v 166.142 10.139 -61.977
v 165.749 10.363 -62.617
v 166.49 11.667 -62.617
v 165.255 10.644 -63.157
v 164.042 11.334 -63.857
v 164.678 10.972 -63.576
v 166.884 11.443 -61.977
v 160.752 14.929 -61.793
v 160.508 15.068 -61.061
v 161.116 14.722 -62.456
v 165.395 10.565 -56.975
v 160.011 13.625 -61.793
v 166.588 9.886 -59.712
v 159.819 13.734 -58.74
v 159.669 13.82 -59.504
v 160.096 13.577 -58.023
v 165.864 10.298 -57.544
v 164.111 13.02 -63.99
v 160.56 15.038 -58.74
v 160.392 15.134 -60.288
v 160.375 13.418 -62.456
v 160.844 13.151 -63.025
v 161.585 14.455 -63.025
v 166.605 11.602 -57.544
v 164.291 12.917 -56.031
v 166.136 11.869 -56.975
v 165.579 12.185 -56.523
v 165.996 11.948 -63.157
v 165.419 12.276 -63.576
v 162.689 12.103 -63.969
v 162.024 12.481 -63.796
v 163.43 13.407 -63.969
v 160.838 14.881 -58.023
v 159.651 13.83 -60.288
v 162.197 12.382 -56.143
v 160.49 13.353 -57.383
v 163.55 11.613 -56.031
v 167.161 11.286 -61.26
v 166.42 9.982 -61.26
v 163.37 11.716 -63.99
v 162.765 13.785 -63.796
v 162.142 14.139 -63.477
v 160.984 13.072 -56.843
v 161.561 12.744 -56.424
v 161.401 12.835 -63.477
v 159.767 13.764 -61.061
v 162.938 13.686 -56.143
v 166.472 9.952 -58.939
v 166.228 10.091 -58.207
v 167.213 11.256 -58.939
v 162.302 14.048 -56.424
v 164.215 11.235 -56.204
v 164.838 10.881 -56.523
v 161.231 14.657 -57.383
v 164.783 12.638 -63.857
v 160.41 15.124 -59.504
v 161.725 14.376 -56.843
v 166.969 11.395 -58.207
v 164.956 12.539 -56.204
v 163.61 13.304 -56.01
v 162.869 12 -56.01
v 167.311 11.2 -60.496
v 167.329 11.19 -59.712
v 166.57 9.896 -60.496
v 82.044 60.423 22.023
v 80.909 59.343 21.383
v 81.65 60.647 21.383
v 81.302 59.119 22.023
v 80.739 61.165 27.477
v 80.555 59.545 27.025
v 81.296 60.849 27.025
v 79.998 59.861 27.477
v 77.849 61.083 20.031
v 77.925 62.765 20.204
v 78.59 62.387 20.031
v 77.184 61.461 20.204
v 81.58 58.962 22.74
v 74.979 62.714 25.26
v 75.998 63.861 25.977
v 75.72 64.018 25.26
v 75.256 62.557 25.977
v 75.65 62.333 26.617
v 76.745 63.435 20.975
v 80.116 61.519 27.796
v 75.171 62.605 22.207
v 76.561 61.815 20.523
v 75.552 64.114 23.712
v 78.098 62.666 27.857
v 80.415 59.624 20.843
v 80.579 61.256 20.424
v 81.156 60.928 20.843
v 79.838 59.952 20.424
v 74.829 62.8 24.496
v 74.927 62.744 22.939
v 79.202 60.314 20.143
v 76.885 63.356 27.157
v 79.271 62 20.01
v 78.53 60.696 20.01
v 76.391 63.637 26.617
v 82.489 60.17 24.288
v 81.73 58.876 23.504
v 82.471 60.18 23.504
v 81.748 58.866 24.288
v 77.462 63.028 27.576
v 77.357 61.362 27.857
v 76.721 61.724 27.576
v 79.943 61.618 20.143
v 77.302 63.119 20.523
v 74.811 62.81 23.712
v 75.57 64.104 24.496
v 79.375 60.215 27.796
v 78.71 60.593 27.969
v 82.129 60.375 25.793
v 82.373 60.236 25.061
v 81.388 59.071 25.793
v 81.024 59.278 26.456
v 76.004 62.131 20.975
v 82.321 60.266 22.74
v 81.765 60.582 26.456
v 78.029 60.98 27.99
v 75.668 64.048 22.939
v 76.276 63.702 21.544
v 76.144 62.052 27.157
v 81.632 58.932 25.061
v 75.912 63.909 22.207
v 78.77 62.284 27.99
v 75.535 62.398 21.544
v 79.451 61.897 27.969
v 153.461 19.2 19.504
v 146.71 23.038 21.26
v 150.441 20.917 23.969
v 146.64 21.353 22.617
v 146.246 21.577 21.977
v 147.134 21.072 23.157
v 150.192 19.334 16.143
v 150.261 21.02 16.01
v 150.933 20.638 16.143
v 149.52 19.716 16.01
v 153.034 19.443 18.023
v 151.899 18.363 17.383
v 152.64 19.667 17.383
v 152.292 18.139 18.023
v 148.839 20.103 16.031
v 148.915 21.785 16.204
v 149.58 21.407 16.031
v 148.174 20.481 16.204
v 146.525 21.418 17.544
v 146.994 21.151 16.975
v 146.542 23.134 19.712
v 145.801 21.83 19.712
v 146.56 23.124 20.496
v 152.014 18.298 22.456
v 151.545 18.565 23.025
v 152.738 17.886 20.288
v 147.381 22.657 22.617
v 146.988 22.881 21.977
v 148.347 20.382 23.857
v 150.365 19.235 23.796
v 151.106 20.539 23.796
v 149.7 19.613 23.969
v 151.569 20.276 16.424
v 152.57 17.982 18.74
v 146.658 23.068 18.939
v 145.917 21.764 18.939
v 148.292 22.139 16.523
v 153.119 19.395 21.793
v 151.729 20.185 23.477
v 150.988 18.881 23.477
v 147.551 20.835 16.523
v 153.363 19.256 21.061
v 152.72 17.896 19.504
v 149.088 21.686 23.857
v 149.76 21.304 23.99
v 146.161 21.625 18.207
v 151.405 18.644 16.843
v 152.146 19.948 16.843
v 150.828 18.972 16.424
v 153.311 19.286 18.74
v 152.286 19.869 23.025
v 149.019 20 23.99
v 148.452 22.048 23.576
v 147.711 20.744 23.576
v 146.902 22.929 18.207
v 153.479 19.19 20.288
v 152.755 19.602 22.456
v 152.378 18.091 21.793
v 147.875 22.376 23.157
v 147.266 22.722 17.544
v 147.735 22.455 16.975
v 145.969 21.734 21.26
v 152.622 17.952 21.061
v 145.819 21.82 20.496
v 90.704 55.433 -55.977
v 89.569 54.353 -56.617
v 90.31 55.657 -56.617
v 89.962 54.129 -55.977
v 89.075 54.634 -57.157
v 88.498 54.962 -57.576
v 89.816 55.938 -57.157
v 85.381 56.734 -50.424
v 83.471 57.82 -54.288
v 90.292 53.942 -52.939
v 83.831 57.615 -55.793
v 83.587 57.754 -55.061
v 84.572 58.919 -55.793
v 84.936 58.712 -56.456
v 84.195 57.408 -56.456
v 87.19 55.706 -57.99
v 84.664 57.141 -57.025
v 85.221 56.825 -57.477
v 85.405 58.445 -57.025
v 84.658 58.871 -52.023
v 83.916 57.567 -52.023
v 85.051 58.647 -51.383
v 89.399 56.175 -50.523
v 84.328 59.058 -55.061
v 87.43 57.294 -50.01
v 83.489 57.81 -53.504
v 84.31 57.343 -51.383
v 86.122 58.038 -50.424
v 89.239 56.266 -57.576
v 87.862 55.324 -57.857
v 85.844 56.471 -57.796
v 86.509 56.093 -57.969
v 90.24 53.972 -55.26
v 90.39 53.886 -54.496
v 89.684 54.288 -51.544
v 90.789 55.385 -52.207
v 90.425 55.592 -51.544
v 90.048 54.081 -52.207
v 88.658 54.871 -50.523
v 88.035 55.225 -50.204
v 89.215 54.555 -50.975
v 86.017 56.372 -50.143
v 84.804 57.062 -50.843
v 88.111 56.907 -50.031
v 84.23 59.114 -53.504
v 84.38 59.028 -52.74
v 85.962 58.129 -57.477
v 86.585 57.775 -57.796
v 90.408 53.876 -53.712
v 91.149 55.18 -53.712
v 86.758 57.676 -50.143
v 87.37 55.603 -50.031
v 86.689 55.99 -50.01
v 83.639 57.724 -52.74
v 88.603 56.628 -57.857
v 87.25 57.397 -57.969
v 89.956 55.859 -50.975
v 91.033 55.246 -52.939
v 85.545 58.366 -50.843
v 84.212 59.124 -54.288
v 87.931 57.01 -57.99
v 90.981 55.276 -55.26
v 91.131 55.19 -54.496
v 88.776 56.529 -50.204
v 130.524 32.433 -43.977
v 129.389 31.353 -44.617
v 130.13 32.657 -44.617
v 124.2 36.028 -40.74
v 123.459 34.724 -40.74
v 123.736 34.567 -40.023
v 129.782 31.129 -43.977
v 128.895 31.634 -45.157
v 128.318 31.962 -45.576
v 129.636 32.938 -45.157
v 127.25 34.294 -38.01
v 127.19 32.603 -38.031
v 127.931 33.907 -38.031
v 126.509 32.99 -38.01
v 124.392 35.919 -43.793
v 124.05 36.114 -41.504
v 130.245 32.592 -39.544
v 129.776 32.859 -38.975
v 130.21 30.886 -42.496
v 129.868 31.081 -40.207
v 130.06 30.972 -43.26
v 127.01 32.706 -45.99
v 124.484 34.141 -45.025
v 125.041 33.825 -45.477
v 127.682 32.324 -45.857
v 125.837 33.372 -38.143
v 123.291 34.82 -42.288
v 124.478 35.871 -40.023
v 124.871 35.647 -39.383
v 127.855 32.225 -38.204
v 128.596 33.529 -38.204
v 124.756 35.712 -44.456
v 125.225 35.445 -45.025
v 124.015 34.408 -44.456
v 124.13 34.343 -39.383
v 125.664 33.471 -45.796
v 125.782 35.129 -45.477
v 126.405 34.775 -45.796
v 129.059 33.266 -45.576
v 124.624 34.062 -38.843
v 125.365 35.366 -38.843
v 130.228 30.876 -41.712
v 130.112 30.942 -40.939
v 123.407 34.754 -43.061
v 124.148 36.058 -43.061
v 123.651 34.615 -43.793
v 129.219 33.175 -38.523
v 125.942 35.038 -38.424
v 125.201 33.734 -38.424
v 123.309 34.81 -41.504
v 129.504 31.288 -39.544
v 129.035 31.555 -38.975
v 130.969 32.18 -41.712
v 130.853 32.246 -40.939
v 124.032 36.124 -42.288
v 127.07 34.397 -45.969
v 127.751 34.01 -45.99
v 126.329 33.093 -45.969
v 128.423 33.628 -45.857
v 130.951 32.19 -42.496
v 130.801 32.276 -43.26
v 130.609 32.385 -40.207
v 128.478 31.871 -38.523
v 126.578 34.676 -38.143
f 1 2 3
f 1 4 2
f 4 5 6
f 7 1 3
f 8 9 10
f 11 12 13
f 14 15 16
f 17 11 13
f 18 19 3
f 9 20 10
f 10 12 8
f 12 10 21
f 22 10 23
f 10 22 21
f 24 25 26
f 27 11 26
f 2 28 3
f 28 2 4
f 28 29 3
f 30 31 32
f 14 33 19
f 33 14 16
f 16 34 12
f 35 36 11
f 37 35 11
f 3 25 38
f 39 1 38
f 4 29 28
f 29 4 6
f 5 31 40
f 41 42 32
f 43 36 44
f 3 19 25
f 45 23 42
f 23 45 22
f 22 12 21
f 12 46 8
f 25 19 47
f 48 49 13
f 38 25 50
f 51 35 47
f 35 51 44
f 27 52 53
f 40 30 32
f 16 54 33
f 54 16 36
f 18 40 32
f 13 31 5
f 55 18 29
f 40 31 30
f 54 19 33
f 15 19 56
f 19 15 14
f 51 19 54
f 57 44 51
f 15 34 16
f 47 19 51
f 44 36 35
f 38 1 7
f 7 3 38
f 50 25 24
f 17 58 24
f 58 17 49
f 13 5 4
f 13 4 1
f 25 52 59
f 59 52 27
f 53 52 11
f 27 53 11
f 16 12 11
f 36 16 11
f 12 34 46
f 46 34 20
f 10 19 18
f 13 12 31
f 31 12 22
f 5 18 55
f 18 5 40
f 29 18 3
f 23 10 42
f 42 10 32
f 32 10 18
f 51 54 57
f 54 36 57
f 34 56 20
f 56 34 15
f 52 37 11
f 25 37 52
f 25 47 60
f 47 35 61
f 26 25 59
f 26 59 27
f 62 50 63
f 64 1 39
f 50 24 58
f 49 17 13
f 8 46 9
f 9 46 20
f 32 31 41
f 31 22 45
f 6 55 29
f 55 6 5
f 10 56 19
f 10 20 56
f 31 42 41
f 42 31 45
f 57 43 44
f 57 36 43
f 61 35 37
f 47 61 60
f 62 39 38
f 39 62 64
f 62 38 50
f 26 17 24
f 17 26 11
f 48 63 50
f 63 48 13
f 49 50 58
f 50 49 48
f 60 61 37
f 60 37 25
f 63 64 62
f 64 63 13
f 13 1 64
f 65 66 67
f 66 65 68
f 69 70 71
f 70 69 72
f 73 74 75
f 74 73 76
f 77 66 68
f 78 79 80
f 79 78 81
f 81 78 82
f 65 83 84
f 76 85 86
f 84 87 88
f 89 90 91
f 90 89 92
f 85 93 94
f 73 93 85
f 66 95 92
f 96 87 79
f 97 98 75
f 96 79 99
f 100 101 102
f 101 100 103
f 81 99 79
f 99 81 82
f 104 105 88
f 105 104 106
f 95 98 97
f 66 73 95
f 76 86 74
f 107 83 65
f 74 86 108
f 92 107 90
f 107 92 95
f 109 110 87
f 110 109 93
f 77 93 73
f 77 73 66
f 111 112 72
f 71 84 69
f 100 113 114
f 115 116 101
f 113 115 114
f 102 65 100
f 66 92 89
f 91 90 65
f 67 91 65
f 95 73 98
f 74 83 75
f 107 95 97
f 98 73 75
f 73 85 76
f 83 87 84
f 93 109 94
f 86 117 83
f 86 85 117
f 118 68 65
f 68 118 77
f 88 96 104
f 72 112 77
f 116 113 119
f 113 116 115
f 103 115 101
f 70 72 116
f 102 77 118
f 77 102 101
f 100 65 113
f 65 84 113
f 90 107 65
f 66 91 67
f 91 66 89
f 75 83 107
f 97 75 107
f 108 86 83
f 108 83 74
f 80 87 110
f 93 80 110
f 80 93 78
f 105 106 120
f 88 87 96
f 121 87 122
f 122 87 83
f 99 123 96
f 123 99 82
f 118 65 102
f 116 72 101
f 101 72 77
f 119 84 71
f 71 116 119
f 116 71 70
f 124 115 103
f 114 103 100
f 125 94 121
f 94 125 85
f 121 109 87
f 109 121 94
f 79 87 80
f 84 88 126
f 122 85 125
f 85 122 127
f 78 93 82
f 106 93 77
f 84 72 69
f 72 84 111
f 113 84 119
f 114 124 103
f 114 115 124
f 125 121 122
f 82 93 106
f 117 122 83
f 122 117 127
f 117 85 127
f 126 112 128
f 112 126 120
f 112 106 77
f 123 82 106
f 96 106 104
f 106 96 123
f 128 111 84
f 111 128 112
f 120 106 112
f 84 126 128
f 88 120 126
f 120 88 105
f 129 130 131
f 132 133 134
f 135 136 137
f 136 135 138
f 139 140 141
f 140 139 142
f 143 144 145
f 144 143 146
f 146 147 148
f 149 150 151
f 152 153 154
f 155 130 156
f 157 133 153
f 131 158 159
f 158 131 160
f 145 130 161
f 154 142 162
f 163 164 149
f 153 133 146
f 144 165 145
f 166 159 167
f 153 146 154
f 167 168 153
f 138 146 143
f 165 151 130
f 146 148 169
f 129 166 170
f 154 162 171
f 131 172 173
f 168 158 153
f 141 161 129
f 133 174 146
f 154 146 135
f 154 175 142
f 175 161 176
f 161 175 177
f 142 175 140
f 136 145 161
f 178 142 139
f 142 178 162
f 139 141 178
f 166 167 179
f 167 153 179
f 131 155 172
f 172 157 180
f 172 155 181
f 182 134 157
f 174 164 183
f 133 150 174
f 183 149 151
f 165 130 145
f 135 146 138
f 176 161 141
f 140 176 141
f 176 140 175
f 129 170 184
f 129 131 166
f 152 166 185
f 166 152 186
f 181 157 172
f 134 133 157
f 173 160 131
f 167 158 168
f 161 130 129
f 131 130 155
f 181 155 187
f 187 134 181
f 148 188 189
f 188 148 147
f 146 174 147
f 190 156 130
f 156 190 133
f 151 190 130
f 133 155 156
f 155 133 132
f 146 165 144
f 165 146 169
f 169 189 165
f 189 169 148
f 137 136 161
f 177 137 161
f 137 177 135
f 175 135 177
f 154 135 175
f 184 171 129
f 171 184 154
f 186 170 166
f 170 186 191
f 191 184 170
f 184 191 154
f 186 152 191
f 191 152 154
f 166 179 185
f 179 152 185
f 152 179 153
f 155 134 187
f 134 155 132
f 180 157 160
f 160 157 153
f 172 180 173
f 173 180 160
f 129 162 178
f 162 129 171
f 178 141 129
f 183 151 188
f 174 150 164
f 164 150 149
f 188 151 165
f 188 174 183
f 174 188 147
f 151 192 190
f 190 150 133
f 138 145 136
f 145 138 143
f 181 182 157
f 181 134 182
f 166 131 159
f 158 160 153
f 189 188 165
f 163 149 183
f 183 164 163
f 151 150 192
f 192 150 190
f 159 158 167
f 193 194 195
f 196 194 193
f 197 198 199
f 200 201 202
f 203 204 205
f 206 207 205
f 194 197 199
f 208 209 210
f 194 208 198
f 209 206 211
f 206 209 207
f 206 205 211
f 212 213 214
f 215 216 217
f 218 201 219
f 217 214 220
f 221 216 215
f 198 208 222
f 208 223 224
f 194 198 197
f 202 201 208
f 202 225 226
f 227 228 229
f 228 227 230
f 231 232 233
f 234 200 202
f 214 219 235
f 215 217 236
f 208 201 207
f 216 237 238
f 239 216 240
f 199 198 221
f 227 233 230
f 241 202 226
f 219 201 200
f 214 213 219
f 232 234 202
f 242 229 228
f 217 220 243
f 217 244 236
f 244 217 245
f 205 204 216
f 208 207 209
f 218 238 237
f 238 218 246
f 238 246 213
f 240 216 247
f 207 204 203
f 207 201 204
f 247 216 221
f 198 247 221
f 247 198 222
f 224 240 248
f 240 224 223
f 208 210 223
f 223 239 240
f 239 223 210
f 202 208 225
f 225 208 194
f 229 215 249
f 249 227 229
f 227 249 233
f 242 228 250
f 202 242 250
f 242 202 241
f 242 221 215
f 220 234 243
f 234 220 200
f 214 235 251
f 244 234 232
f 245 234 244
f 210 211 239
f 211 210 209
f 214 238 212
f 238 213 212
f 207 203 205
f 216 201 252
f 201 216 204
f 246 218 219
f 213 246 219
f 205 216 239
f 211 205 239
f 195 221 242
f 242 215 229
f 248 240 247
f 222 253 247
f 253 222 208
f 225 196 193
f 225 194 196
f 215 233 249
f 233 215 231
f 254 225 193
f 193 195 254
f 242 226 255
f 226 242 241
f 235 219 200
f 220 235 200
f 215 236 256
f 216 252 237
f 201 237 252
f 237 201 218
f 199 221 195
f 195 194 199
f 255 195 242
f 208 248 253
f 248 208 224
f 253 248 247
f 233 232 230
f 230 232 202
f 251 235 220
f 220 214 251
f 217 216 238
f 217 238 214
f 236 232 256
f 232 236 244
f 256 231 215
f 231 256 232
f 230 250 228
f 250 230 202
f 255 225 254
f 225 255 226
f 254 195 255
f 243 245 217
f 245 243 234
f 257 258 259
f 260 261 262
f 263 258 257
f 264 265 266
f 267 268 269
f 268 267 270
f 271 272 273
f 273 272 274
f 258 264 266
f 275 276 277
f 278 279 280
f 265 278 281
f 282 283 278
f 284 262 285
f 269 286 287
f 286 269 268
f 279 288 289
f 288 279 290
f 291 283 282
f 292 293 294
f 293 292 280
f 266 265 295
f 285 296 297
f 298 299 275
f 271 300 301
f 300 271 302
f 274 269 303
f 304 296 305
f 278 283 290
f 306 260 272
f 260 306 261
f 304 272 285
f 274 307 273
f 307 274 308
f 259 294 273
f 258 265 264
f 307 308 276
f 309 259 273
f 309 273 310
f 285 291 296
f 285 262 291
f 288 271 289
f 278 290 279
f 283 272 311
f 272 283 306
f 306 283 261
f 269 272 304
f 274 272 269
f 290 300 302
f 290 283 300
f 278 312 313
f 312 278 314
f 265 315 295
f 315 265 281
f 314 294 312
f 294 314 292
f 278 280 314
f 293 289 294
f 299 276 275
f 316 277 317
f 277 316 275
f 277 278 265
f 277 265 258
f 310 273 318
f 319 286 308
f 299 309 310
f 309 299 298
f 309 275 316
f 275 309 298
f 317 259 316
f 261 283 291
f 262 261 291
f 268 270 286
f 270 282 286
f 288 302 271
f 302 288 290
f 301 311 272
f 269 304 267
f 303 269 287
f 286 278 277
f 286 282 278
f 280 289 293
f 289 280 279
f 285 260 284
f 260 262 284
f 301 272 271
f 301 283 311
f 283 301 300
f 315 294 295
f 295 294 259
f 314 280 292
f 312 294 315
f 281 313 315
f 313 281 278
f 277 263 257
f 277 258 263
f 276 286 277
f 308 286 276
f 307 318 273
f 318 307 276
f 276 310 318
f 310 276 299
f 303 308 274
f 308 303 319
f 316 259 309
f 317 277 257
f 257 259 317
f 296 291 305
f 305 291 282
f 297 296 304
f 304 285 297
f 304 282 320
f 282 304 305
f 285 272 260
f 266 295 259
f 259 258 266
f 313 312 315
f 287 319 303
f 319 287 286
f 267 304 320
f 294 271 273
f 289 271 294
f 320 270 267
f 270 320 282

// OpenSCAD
top=[[163.49,12.51,-60],[78.65,61.49,24],[149.64,20.51,20],[87.31,56.5,-54],[127.13,33.5,-42]];
module disc(d,h) rotate(a=90,v=[-0.869,0.494,0]) translate([0,0,-h/2]) cylinder(d=d,h=h,$fn=32);
for(p=top) translate(p) disc(8,1.5);
